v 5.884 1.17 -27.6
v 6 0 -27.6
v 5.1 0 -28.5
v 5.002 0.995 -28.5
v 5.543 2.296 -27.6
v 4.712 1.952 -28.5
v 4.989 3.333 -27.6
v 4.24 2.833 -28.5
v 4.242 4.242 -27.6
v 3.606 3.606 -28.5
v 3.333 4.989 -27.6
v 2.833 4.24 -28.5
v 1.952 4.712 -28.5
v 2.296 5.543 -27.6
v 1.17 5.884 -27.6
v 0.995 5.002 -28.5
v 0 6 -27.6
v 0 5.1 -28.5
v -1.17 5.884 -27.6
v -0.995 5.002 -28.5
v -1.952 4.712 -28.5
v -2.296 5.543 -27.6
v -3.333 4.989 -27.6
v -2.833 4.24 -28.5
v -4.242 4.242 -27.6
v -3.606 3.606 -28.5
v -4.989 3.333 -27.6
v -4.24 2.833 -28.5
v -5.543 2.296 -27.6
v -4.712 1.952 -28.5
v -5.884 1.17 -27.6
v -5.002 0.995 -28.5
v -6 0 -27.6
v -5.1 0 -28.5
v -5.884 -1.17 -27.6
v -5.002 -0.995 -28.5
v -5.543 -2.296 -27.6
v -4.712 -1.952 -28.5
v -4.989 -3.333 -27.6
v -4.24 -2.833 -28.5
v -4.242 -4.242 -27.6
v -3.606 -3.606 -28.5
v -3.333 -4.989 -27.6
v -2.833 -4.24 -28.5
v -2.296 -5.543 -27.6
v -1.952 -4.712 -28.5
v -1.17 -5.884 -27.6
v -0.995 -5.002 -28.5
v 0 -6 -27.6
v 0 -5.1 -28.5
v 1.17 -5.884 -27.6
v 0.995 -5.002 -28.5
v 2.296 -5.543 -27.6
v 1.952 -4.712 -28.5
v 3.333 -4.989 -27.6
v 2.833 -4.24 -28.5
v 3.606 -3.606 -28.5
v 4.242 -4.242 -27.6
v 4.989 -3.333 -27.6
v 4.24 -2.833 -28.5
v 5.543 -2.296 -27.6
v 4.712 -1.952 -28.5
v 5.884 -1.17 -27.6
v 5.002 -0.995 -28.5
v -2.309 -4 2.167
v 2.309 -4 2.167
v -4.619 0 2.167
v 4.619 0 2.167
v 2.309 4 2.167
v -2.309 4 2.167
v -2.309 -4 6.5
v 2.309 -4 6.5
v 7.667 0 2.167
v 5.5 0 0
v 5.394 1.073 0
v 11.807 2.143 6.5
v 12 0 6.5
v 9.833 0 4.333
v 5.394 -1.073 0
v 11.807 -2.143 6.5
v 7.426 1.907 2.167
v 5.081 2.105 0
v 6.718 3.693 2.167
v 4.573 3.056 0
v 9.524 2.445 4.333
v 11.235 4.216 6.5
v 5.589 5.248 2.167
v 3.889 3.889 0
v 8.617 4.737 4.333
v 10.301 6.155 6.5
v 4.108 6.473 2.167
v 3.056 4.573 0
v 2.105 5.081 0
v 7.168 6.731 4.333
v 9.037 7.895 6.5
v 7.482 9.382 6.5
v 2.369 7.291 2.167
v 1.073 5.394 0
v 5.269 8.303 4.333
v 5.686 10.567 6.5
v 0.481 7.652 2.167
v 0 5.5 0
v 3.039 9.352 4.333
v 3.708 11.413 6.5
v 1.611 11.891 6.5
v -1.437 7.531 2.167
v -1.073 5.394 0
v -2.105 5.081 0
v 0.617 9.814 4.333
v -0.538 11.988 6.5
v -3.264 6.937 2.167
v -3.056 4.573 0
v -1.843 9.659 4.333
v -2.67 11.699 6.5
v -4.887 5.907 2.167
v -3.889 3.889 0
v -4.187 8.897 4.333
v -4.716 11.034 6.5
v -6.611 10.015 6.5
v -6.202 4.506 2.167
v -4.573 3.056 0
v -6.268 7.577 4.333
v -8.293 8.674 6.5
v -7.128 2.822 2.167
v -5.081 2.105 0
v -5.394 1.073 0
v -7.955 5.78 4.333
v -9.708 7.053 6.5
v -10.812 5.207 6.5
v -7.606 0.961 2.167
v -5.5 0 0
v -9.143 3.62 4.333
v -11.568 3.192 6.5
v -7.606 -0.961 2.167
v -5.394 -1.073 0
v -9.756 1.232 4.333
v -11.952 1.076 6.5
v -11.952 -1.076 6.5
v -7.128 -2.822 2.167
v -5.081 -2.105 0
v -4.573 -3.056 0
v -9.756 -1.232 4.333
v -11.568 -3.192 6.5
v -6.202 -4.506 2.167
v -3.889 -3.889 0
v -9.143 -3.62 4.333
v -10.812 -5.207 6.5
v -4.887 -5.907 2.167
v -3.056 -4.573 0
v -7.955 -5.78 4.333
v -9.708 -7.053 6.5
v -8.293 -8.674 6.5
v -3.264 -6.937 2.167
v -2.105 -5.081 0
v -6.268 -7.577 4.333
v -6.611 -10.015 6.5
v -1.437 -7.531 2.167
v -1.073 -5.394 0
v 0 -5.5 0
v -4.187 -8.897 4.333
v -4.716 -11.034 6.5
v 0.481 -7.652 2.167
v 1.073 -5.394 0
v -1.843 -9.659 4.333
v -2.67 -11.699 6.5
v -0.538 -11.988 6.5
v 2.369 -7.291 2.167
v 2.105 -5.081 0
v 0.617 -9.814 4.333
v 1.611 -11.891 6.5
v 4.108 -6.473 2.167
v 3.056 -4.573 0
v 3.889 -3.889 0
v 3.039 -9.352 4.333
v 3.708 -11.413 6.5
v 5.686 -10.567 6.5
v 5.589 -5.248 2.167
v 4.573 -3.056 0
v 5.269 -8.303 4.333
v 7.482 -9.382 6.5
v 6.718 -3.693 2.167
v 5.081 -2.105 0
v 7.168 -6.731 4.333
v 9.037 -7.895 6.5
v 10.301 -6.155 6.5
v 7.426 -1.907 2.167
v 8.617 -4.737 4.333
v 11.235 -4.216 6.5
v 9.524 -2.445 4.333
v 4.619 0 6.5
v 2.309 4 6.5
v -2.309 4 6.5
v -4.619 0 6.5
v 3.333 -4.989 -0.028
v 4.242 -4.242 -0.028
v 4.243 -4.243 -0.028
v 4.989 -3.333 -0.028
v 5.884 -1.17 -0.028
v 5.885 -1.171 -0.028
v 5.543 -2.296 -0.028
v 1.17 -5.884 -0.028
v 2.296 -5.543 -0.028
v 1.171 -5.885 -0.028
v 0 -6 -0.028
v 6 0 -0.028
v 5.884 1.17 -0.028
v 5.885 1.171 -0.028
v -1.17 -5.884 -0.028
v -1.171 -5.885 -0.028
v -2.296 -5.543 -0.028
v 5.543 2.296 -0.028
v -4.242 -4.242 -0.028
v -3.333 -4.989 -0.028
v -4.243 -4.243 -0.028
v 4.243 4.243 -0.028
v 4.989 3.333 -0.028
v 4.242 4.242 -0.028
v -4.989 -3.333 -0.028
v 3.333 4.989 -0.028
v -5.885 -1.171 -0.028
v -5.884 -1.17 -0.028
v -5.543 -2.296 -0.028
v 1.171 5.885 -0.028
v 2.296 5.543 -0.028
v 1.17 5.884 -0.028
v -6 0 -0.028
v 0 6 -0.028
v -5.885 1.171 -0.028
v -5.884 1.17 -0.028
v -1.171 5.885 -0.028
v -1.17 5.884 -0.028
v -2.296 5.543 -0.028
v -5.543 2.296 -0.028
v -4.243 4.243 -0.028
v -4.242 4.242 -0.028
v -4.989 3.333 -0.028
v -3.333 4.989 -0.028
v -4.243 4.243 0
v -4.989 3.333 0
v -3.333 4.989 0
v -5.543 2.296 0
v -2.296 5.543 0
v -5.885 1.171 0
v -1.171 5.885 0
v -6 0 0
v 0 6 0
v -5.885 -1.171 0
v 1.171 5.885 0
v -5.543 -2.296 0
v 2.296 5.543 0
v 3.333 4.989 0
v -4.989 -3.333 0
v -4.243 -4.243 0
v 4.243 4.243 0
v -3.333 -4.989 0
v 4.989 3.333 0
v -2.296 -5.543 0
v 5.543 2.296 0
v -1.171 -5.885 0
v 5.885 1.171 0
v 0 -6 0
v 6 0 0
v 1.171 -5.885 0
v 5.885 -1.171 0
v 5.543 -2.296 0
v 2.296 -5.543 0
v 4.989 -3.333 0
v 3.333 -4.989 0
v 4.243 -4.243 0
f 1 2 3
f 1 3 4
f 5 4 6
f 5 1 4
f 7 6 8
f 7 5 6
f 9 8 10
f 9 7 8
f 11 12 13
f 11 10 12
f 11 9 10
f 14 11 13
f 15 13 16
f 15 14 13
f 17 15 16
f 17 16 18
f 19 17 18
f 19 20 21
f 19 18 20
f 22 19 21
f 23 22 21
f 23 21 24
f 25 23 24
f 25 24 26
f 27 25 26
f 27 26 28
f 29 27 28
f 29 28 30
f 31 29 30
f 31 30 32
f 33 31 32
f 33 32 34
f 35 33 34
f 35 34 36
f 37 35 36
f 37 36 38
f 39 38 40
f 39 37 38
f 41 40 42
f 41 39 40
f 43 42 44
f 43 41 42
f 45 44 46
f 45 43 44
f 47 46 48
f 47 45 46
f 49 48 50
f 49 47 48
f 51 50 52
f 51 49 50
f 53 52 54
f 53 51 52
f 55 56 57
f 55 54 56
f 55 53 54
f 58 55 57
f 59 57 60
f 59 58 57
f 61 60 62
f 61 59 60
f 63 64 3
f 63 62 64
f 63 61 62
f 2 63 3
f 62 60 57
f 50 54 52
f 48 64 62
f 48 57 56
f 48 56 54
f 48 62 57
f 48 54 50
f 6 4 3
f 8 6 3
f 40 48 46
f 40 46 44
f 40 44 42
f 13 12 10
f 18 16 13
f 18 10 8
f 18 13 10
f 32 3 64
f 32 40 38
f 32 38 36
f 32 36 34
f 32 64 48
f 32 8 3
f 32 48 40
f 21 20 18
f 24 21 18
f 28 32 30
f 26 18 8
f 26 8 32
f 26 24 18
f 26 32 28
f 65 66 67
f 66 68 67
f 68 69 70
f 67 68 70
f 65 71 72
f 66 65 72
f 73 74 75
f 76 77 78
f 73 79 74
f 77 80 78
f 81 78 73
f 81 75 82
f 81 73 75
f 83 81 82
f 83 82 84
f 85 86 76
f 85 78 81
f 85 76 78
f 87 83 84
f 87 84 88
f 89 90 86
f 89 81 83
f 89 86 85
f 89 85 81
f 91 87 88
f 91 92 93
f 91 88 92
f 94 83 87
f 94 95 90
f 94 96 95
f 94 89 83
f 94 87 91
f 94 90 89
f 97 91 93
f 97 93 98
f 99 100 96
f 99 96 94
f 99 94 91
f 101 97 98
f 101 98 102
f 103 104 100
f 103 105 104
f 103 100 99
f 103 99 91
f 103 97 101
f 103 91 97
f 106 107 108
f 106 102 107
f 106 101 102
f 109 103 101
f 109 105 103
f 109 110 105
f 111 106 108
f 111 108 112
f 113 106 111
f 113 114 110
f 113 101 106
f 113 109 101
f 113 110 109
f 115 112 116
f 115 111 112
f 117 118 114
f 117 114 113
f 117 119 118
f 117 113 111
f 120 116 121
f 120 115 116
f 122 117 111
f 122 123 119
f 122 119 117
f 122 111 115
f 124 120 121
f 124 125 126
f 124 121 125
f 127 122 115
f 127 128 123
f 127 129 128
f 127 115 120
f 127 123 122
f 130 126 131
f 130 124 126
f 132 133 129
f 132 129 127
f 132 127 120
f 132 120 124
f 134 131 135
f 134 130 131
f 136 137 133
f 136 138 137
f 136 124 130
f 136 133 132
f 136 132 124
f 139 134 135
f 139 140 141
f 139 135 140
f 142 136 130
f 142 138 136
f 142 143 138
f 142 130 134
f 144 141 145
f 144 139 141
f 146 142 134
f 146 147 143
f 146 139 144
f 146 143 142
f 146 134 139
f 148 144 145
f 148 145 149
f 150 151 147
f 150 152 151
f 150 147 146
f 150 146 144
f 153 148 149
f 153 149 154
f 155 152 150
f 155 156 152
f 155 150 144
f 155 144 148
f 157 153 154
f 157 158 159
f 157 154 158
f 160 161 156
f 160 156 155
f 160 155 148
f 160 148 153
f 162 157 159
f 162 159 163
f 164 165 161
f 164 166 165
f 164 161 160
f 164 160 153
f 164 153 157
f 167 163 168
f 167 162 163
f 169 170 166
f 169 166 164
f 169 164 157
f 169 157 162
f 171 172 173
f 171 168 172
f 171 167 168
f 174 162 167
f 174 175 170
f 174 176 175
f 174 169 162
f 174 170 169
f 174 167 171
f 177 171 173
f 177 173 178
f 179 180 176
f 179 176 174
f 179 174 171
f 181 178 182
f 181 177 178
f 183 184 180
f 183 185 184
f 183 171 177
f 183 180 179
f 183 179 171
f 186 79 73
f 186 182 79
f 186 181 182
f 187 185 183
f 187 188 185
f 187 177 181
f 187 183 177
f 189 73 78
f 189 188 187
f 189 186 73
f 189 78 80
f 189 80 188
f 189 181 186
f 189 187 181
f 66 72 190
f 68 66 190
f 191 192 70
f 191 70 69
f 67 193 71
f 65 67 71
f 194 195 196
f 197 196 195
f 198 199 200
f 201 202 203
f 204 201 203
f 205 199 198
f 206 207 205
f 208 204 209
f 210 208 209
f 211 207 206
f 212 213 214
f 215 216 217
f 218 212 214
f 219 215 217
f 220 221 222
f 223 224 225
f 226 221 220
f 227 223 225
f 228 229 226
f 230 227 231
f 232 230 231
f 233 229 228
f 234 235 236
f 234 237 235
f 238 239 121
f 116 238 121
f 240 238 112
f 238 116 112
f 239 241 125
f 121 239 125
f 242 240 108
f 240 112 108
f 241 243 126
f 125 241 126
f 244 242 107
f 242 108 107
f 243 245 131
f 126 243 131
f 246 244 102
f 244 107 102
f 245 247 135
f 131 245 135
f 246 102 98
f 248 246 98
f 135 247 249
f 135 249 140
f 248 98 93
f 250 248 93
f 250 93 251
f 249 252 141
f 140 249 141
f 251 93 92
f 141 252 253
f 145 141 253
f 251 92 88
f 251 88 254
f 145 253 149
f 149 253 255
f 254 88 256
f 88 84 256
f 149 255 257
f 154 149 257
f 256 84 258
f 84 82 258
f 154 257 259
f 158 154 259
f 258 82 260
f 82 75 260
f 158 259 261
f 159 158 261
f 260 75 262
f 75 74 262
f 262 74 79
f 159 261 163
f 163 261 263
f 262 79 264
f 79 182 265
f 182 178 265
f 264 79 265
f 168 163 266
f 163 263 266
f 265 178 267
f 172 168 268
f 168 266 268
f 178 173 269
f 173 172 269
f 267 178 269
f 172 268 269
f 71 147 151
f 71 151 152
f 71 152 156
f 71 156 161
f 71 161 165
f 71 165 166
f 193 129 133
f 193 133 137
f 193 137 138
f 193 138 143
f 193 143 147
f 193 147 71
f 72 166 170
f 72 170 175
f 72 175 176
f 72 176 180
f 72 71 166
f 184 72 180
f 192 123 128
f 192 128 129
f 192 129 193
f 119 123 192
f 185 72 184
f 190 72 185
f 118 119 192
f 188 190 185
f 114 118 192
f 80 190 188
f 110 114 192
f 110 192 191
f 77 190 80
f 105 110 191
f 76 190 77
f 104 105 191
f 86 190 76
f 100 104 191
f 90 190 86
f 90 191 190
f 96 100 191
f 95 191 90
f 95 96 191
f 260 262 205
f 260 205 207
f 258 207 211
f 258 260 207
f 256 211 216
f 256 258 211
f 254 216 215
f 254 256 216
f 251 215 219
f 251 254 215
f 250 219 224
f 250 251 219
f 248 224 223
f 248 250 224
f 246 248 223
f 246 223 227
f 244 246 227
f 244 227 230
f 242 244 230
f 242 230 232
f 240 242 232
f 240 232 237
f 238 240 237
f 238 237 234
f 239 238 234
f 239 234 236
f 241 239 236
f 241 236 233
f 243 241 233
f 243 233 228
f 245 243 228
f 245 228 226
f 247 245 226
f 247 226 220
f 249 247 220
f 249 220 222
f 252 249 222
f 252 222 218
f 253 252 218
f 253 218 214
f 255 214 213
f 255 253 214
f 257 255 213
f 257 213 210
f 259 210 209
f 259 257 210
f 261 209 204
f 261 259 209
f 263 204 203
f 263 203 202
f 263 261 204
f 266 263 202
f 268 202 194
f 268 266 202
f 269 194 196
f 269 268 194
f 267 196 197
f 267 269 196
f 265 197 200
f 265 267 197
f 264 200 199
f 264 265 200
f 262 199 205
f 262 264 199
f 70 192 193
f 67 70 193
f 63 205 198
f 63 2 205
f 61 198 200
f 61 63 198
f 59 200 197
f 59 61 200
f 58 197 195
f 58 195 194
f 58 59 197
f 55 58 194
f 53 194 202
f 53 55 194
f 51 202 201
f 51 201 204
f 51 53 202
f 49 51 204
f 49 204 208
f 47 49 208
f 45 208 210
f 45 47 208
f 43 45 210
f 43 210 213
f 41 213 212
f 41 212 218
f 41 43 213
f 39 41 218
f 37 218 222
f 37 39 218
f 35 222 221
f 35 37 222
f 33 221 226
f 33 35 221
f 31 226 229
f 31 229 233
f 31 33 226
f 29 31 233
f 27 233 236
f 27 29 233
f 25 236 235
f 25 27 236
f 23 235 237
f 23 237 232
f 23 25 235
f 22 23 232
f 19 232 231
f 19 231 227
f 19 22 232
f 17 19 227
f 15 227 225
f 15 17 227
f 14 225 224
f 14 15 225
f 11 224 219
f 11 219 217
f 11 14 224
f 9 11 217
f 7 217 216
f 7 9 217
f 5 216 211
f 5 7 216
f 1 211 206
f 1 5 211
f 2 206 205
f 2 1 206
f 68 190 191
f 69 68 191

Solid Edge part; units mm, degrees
sketch "Sketch1" plane through (0, 0, 0) normal (0, 0, 1) x (1, 0, 0)
  circle A0 centre (0, 0) radius 12
  dimension "D1" = 24
extrude "Protrusion1" add sketch "Sketch1" along normal blind 6.5
sketch "Sketch2" plane through (0, 0, 0) normal (0, 0, -1) x (1, 0, 0)
  circle A0 centre (0, 0) radius 6
extrude "Protrusion2" add sketch "Sketch2" along normal blind 28.5
sketch "Sketch3" plane through (0, 0, -28.5) normal (0, 0, -1) x (1, 0, 0)
  circle A0 centre (0, 0) radius 5.9997
extrude "Cutout1" cut sketch "Sketch3" against normal blind 28.4715 flip side to cut
chamfer "Chamfer_1" distance 0.9 angle 45 1 edges at (-5.9997, 0, -28.5)
sketch "Sketch4" plane through (0, 0, 6.5) normal (0, 0, 1) x (1, 0, 0)
  line L0 (-2.3094, 4) -> (2.3094, 4)
  line L1 (4.6188, 0) -> (2.3094, 4)
  line L2 (2.3094, -4) -> (4.6188, 0)
  line L3 (-2.3094, -4) -> (2.3094, -4)
  line L4 (-4.6188, 0) -> (-2.3094, -4)
  line L5 (-2.3094, 4) -> (-4.6188, 0)
  dimension "D1" = 8
extrude "Cutout2" cut sketch "Sketch4" against normal blind 4.3333
sketch "Sketch5" plane through (0, 0, 0) normal (0, -1, 0) x (1, 0, 0)
  line L0 (12, 6.5) -> (5.5, 0)
  line L1 (5.5, 0) -> (12, 0)
  line L2 (12, 0) -> (12, 6.5)
revolve "RevolvedCutout1" cut sketch "Sketch5" angle 360 about axis through (0, 0, 14.0017) along (0, 0, -1)
properties part number "24104732"
